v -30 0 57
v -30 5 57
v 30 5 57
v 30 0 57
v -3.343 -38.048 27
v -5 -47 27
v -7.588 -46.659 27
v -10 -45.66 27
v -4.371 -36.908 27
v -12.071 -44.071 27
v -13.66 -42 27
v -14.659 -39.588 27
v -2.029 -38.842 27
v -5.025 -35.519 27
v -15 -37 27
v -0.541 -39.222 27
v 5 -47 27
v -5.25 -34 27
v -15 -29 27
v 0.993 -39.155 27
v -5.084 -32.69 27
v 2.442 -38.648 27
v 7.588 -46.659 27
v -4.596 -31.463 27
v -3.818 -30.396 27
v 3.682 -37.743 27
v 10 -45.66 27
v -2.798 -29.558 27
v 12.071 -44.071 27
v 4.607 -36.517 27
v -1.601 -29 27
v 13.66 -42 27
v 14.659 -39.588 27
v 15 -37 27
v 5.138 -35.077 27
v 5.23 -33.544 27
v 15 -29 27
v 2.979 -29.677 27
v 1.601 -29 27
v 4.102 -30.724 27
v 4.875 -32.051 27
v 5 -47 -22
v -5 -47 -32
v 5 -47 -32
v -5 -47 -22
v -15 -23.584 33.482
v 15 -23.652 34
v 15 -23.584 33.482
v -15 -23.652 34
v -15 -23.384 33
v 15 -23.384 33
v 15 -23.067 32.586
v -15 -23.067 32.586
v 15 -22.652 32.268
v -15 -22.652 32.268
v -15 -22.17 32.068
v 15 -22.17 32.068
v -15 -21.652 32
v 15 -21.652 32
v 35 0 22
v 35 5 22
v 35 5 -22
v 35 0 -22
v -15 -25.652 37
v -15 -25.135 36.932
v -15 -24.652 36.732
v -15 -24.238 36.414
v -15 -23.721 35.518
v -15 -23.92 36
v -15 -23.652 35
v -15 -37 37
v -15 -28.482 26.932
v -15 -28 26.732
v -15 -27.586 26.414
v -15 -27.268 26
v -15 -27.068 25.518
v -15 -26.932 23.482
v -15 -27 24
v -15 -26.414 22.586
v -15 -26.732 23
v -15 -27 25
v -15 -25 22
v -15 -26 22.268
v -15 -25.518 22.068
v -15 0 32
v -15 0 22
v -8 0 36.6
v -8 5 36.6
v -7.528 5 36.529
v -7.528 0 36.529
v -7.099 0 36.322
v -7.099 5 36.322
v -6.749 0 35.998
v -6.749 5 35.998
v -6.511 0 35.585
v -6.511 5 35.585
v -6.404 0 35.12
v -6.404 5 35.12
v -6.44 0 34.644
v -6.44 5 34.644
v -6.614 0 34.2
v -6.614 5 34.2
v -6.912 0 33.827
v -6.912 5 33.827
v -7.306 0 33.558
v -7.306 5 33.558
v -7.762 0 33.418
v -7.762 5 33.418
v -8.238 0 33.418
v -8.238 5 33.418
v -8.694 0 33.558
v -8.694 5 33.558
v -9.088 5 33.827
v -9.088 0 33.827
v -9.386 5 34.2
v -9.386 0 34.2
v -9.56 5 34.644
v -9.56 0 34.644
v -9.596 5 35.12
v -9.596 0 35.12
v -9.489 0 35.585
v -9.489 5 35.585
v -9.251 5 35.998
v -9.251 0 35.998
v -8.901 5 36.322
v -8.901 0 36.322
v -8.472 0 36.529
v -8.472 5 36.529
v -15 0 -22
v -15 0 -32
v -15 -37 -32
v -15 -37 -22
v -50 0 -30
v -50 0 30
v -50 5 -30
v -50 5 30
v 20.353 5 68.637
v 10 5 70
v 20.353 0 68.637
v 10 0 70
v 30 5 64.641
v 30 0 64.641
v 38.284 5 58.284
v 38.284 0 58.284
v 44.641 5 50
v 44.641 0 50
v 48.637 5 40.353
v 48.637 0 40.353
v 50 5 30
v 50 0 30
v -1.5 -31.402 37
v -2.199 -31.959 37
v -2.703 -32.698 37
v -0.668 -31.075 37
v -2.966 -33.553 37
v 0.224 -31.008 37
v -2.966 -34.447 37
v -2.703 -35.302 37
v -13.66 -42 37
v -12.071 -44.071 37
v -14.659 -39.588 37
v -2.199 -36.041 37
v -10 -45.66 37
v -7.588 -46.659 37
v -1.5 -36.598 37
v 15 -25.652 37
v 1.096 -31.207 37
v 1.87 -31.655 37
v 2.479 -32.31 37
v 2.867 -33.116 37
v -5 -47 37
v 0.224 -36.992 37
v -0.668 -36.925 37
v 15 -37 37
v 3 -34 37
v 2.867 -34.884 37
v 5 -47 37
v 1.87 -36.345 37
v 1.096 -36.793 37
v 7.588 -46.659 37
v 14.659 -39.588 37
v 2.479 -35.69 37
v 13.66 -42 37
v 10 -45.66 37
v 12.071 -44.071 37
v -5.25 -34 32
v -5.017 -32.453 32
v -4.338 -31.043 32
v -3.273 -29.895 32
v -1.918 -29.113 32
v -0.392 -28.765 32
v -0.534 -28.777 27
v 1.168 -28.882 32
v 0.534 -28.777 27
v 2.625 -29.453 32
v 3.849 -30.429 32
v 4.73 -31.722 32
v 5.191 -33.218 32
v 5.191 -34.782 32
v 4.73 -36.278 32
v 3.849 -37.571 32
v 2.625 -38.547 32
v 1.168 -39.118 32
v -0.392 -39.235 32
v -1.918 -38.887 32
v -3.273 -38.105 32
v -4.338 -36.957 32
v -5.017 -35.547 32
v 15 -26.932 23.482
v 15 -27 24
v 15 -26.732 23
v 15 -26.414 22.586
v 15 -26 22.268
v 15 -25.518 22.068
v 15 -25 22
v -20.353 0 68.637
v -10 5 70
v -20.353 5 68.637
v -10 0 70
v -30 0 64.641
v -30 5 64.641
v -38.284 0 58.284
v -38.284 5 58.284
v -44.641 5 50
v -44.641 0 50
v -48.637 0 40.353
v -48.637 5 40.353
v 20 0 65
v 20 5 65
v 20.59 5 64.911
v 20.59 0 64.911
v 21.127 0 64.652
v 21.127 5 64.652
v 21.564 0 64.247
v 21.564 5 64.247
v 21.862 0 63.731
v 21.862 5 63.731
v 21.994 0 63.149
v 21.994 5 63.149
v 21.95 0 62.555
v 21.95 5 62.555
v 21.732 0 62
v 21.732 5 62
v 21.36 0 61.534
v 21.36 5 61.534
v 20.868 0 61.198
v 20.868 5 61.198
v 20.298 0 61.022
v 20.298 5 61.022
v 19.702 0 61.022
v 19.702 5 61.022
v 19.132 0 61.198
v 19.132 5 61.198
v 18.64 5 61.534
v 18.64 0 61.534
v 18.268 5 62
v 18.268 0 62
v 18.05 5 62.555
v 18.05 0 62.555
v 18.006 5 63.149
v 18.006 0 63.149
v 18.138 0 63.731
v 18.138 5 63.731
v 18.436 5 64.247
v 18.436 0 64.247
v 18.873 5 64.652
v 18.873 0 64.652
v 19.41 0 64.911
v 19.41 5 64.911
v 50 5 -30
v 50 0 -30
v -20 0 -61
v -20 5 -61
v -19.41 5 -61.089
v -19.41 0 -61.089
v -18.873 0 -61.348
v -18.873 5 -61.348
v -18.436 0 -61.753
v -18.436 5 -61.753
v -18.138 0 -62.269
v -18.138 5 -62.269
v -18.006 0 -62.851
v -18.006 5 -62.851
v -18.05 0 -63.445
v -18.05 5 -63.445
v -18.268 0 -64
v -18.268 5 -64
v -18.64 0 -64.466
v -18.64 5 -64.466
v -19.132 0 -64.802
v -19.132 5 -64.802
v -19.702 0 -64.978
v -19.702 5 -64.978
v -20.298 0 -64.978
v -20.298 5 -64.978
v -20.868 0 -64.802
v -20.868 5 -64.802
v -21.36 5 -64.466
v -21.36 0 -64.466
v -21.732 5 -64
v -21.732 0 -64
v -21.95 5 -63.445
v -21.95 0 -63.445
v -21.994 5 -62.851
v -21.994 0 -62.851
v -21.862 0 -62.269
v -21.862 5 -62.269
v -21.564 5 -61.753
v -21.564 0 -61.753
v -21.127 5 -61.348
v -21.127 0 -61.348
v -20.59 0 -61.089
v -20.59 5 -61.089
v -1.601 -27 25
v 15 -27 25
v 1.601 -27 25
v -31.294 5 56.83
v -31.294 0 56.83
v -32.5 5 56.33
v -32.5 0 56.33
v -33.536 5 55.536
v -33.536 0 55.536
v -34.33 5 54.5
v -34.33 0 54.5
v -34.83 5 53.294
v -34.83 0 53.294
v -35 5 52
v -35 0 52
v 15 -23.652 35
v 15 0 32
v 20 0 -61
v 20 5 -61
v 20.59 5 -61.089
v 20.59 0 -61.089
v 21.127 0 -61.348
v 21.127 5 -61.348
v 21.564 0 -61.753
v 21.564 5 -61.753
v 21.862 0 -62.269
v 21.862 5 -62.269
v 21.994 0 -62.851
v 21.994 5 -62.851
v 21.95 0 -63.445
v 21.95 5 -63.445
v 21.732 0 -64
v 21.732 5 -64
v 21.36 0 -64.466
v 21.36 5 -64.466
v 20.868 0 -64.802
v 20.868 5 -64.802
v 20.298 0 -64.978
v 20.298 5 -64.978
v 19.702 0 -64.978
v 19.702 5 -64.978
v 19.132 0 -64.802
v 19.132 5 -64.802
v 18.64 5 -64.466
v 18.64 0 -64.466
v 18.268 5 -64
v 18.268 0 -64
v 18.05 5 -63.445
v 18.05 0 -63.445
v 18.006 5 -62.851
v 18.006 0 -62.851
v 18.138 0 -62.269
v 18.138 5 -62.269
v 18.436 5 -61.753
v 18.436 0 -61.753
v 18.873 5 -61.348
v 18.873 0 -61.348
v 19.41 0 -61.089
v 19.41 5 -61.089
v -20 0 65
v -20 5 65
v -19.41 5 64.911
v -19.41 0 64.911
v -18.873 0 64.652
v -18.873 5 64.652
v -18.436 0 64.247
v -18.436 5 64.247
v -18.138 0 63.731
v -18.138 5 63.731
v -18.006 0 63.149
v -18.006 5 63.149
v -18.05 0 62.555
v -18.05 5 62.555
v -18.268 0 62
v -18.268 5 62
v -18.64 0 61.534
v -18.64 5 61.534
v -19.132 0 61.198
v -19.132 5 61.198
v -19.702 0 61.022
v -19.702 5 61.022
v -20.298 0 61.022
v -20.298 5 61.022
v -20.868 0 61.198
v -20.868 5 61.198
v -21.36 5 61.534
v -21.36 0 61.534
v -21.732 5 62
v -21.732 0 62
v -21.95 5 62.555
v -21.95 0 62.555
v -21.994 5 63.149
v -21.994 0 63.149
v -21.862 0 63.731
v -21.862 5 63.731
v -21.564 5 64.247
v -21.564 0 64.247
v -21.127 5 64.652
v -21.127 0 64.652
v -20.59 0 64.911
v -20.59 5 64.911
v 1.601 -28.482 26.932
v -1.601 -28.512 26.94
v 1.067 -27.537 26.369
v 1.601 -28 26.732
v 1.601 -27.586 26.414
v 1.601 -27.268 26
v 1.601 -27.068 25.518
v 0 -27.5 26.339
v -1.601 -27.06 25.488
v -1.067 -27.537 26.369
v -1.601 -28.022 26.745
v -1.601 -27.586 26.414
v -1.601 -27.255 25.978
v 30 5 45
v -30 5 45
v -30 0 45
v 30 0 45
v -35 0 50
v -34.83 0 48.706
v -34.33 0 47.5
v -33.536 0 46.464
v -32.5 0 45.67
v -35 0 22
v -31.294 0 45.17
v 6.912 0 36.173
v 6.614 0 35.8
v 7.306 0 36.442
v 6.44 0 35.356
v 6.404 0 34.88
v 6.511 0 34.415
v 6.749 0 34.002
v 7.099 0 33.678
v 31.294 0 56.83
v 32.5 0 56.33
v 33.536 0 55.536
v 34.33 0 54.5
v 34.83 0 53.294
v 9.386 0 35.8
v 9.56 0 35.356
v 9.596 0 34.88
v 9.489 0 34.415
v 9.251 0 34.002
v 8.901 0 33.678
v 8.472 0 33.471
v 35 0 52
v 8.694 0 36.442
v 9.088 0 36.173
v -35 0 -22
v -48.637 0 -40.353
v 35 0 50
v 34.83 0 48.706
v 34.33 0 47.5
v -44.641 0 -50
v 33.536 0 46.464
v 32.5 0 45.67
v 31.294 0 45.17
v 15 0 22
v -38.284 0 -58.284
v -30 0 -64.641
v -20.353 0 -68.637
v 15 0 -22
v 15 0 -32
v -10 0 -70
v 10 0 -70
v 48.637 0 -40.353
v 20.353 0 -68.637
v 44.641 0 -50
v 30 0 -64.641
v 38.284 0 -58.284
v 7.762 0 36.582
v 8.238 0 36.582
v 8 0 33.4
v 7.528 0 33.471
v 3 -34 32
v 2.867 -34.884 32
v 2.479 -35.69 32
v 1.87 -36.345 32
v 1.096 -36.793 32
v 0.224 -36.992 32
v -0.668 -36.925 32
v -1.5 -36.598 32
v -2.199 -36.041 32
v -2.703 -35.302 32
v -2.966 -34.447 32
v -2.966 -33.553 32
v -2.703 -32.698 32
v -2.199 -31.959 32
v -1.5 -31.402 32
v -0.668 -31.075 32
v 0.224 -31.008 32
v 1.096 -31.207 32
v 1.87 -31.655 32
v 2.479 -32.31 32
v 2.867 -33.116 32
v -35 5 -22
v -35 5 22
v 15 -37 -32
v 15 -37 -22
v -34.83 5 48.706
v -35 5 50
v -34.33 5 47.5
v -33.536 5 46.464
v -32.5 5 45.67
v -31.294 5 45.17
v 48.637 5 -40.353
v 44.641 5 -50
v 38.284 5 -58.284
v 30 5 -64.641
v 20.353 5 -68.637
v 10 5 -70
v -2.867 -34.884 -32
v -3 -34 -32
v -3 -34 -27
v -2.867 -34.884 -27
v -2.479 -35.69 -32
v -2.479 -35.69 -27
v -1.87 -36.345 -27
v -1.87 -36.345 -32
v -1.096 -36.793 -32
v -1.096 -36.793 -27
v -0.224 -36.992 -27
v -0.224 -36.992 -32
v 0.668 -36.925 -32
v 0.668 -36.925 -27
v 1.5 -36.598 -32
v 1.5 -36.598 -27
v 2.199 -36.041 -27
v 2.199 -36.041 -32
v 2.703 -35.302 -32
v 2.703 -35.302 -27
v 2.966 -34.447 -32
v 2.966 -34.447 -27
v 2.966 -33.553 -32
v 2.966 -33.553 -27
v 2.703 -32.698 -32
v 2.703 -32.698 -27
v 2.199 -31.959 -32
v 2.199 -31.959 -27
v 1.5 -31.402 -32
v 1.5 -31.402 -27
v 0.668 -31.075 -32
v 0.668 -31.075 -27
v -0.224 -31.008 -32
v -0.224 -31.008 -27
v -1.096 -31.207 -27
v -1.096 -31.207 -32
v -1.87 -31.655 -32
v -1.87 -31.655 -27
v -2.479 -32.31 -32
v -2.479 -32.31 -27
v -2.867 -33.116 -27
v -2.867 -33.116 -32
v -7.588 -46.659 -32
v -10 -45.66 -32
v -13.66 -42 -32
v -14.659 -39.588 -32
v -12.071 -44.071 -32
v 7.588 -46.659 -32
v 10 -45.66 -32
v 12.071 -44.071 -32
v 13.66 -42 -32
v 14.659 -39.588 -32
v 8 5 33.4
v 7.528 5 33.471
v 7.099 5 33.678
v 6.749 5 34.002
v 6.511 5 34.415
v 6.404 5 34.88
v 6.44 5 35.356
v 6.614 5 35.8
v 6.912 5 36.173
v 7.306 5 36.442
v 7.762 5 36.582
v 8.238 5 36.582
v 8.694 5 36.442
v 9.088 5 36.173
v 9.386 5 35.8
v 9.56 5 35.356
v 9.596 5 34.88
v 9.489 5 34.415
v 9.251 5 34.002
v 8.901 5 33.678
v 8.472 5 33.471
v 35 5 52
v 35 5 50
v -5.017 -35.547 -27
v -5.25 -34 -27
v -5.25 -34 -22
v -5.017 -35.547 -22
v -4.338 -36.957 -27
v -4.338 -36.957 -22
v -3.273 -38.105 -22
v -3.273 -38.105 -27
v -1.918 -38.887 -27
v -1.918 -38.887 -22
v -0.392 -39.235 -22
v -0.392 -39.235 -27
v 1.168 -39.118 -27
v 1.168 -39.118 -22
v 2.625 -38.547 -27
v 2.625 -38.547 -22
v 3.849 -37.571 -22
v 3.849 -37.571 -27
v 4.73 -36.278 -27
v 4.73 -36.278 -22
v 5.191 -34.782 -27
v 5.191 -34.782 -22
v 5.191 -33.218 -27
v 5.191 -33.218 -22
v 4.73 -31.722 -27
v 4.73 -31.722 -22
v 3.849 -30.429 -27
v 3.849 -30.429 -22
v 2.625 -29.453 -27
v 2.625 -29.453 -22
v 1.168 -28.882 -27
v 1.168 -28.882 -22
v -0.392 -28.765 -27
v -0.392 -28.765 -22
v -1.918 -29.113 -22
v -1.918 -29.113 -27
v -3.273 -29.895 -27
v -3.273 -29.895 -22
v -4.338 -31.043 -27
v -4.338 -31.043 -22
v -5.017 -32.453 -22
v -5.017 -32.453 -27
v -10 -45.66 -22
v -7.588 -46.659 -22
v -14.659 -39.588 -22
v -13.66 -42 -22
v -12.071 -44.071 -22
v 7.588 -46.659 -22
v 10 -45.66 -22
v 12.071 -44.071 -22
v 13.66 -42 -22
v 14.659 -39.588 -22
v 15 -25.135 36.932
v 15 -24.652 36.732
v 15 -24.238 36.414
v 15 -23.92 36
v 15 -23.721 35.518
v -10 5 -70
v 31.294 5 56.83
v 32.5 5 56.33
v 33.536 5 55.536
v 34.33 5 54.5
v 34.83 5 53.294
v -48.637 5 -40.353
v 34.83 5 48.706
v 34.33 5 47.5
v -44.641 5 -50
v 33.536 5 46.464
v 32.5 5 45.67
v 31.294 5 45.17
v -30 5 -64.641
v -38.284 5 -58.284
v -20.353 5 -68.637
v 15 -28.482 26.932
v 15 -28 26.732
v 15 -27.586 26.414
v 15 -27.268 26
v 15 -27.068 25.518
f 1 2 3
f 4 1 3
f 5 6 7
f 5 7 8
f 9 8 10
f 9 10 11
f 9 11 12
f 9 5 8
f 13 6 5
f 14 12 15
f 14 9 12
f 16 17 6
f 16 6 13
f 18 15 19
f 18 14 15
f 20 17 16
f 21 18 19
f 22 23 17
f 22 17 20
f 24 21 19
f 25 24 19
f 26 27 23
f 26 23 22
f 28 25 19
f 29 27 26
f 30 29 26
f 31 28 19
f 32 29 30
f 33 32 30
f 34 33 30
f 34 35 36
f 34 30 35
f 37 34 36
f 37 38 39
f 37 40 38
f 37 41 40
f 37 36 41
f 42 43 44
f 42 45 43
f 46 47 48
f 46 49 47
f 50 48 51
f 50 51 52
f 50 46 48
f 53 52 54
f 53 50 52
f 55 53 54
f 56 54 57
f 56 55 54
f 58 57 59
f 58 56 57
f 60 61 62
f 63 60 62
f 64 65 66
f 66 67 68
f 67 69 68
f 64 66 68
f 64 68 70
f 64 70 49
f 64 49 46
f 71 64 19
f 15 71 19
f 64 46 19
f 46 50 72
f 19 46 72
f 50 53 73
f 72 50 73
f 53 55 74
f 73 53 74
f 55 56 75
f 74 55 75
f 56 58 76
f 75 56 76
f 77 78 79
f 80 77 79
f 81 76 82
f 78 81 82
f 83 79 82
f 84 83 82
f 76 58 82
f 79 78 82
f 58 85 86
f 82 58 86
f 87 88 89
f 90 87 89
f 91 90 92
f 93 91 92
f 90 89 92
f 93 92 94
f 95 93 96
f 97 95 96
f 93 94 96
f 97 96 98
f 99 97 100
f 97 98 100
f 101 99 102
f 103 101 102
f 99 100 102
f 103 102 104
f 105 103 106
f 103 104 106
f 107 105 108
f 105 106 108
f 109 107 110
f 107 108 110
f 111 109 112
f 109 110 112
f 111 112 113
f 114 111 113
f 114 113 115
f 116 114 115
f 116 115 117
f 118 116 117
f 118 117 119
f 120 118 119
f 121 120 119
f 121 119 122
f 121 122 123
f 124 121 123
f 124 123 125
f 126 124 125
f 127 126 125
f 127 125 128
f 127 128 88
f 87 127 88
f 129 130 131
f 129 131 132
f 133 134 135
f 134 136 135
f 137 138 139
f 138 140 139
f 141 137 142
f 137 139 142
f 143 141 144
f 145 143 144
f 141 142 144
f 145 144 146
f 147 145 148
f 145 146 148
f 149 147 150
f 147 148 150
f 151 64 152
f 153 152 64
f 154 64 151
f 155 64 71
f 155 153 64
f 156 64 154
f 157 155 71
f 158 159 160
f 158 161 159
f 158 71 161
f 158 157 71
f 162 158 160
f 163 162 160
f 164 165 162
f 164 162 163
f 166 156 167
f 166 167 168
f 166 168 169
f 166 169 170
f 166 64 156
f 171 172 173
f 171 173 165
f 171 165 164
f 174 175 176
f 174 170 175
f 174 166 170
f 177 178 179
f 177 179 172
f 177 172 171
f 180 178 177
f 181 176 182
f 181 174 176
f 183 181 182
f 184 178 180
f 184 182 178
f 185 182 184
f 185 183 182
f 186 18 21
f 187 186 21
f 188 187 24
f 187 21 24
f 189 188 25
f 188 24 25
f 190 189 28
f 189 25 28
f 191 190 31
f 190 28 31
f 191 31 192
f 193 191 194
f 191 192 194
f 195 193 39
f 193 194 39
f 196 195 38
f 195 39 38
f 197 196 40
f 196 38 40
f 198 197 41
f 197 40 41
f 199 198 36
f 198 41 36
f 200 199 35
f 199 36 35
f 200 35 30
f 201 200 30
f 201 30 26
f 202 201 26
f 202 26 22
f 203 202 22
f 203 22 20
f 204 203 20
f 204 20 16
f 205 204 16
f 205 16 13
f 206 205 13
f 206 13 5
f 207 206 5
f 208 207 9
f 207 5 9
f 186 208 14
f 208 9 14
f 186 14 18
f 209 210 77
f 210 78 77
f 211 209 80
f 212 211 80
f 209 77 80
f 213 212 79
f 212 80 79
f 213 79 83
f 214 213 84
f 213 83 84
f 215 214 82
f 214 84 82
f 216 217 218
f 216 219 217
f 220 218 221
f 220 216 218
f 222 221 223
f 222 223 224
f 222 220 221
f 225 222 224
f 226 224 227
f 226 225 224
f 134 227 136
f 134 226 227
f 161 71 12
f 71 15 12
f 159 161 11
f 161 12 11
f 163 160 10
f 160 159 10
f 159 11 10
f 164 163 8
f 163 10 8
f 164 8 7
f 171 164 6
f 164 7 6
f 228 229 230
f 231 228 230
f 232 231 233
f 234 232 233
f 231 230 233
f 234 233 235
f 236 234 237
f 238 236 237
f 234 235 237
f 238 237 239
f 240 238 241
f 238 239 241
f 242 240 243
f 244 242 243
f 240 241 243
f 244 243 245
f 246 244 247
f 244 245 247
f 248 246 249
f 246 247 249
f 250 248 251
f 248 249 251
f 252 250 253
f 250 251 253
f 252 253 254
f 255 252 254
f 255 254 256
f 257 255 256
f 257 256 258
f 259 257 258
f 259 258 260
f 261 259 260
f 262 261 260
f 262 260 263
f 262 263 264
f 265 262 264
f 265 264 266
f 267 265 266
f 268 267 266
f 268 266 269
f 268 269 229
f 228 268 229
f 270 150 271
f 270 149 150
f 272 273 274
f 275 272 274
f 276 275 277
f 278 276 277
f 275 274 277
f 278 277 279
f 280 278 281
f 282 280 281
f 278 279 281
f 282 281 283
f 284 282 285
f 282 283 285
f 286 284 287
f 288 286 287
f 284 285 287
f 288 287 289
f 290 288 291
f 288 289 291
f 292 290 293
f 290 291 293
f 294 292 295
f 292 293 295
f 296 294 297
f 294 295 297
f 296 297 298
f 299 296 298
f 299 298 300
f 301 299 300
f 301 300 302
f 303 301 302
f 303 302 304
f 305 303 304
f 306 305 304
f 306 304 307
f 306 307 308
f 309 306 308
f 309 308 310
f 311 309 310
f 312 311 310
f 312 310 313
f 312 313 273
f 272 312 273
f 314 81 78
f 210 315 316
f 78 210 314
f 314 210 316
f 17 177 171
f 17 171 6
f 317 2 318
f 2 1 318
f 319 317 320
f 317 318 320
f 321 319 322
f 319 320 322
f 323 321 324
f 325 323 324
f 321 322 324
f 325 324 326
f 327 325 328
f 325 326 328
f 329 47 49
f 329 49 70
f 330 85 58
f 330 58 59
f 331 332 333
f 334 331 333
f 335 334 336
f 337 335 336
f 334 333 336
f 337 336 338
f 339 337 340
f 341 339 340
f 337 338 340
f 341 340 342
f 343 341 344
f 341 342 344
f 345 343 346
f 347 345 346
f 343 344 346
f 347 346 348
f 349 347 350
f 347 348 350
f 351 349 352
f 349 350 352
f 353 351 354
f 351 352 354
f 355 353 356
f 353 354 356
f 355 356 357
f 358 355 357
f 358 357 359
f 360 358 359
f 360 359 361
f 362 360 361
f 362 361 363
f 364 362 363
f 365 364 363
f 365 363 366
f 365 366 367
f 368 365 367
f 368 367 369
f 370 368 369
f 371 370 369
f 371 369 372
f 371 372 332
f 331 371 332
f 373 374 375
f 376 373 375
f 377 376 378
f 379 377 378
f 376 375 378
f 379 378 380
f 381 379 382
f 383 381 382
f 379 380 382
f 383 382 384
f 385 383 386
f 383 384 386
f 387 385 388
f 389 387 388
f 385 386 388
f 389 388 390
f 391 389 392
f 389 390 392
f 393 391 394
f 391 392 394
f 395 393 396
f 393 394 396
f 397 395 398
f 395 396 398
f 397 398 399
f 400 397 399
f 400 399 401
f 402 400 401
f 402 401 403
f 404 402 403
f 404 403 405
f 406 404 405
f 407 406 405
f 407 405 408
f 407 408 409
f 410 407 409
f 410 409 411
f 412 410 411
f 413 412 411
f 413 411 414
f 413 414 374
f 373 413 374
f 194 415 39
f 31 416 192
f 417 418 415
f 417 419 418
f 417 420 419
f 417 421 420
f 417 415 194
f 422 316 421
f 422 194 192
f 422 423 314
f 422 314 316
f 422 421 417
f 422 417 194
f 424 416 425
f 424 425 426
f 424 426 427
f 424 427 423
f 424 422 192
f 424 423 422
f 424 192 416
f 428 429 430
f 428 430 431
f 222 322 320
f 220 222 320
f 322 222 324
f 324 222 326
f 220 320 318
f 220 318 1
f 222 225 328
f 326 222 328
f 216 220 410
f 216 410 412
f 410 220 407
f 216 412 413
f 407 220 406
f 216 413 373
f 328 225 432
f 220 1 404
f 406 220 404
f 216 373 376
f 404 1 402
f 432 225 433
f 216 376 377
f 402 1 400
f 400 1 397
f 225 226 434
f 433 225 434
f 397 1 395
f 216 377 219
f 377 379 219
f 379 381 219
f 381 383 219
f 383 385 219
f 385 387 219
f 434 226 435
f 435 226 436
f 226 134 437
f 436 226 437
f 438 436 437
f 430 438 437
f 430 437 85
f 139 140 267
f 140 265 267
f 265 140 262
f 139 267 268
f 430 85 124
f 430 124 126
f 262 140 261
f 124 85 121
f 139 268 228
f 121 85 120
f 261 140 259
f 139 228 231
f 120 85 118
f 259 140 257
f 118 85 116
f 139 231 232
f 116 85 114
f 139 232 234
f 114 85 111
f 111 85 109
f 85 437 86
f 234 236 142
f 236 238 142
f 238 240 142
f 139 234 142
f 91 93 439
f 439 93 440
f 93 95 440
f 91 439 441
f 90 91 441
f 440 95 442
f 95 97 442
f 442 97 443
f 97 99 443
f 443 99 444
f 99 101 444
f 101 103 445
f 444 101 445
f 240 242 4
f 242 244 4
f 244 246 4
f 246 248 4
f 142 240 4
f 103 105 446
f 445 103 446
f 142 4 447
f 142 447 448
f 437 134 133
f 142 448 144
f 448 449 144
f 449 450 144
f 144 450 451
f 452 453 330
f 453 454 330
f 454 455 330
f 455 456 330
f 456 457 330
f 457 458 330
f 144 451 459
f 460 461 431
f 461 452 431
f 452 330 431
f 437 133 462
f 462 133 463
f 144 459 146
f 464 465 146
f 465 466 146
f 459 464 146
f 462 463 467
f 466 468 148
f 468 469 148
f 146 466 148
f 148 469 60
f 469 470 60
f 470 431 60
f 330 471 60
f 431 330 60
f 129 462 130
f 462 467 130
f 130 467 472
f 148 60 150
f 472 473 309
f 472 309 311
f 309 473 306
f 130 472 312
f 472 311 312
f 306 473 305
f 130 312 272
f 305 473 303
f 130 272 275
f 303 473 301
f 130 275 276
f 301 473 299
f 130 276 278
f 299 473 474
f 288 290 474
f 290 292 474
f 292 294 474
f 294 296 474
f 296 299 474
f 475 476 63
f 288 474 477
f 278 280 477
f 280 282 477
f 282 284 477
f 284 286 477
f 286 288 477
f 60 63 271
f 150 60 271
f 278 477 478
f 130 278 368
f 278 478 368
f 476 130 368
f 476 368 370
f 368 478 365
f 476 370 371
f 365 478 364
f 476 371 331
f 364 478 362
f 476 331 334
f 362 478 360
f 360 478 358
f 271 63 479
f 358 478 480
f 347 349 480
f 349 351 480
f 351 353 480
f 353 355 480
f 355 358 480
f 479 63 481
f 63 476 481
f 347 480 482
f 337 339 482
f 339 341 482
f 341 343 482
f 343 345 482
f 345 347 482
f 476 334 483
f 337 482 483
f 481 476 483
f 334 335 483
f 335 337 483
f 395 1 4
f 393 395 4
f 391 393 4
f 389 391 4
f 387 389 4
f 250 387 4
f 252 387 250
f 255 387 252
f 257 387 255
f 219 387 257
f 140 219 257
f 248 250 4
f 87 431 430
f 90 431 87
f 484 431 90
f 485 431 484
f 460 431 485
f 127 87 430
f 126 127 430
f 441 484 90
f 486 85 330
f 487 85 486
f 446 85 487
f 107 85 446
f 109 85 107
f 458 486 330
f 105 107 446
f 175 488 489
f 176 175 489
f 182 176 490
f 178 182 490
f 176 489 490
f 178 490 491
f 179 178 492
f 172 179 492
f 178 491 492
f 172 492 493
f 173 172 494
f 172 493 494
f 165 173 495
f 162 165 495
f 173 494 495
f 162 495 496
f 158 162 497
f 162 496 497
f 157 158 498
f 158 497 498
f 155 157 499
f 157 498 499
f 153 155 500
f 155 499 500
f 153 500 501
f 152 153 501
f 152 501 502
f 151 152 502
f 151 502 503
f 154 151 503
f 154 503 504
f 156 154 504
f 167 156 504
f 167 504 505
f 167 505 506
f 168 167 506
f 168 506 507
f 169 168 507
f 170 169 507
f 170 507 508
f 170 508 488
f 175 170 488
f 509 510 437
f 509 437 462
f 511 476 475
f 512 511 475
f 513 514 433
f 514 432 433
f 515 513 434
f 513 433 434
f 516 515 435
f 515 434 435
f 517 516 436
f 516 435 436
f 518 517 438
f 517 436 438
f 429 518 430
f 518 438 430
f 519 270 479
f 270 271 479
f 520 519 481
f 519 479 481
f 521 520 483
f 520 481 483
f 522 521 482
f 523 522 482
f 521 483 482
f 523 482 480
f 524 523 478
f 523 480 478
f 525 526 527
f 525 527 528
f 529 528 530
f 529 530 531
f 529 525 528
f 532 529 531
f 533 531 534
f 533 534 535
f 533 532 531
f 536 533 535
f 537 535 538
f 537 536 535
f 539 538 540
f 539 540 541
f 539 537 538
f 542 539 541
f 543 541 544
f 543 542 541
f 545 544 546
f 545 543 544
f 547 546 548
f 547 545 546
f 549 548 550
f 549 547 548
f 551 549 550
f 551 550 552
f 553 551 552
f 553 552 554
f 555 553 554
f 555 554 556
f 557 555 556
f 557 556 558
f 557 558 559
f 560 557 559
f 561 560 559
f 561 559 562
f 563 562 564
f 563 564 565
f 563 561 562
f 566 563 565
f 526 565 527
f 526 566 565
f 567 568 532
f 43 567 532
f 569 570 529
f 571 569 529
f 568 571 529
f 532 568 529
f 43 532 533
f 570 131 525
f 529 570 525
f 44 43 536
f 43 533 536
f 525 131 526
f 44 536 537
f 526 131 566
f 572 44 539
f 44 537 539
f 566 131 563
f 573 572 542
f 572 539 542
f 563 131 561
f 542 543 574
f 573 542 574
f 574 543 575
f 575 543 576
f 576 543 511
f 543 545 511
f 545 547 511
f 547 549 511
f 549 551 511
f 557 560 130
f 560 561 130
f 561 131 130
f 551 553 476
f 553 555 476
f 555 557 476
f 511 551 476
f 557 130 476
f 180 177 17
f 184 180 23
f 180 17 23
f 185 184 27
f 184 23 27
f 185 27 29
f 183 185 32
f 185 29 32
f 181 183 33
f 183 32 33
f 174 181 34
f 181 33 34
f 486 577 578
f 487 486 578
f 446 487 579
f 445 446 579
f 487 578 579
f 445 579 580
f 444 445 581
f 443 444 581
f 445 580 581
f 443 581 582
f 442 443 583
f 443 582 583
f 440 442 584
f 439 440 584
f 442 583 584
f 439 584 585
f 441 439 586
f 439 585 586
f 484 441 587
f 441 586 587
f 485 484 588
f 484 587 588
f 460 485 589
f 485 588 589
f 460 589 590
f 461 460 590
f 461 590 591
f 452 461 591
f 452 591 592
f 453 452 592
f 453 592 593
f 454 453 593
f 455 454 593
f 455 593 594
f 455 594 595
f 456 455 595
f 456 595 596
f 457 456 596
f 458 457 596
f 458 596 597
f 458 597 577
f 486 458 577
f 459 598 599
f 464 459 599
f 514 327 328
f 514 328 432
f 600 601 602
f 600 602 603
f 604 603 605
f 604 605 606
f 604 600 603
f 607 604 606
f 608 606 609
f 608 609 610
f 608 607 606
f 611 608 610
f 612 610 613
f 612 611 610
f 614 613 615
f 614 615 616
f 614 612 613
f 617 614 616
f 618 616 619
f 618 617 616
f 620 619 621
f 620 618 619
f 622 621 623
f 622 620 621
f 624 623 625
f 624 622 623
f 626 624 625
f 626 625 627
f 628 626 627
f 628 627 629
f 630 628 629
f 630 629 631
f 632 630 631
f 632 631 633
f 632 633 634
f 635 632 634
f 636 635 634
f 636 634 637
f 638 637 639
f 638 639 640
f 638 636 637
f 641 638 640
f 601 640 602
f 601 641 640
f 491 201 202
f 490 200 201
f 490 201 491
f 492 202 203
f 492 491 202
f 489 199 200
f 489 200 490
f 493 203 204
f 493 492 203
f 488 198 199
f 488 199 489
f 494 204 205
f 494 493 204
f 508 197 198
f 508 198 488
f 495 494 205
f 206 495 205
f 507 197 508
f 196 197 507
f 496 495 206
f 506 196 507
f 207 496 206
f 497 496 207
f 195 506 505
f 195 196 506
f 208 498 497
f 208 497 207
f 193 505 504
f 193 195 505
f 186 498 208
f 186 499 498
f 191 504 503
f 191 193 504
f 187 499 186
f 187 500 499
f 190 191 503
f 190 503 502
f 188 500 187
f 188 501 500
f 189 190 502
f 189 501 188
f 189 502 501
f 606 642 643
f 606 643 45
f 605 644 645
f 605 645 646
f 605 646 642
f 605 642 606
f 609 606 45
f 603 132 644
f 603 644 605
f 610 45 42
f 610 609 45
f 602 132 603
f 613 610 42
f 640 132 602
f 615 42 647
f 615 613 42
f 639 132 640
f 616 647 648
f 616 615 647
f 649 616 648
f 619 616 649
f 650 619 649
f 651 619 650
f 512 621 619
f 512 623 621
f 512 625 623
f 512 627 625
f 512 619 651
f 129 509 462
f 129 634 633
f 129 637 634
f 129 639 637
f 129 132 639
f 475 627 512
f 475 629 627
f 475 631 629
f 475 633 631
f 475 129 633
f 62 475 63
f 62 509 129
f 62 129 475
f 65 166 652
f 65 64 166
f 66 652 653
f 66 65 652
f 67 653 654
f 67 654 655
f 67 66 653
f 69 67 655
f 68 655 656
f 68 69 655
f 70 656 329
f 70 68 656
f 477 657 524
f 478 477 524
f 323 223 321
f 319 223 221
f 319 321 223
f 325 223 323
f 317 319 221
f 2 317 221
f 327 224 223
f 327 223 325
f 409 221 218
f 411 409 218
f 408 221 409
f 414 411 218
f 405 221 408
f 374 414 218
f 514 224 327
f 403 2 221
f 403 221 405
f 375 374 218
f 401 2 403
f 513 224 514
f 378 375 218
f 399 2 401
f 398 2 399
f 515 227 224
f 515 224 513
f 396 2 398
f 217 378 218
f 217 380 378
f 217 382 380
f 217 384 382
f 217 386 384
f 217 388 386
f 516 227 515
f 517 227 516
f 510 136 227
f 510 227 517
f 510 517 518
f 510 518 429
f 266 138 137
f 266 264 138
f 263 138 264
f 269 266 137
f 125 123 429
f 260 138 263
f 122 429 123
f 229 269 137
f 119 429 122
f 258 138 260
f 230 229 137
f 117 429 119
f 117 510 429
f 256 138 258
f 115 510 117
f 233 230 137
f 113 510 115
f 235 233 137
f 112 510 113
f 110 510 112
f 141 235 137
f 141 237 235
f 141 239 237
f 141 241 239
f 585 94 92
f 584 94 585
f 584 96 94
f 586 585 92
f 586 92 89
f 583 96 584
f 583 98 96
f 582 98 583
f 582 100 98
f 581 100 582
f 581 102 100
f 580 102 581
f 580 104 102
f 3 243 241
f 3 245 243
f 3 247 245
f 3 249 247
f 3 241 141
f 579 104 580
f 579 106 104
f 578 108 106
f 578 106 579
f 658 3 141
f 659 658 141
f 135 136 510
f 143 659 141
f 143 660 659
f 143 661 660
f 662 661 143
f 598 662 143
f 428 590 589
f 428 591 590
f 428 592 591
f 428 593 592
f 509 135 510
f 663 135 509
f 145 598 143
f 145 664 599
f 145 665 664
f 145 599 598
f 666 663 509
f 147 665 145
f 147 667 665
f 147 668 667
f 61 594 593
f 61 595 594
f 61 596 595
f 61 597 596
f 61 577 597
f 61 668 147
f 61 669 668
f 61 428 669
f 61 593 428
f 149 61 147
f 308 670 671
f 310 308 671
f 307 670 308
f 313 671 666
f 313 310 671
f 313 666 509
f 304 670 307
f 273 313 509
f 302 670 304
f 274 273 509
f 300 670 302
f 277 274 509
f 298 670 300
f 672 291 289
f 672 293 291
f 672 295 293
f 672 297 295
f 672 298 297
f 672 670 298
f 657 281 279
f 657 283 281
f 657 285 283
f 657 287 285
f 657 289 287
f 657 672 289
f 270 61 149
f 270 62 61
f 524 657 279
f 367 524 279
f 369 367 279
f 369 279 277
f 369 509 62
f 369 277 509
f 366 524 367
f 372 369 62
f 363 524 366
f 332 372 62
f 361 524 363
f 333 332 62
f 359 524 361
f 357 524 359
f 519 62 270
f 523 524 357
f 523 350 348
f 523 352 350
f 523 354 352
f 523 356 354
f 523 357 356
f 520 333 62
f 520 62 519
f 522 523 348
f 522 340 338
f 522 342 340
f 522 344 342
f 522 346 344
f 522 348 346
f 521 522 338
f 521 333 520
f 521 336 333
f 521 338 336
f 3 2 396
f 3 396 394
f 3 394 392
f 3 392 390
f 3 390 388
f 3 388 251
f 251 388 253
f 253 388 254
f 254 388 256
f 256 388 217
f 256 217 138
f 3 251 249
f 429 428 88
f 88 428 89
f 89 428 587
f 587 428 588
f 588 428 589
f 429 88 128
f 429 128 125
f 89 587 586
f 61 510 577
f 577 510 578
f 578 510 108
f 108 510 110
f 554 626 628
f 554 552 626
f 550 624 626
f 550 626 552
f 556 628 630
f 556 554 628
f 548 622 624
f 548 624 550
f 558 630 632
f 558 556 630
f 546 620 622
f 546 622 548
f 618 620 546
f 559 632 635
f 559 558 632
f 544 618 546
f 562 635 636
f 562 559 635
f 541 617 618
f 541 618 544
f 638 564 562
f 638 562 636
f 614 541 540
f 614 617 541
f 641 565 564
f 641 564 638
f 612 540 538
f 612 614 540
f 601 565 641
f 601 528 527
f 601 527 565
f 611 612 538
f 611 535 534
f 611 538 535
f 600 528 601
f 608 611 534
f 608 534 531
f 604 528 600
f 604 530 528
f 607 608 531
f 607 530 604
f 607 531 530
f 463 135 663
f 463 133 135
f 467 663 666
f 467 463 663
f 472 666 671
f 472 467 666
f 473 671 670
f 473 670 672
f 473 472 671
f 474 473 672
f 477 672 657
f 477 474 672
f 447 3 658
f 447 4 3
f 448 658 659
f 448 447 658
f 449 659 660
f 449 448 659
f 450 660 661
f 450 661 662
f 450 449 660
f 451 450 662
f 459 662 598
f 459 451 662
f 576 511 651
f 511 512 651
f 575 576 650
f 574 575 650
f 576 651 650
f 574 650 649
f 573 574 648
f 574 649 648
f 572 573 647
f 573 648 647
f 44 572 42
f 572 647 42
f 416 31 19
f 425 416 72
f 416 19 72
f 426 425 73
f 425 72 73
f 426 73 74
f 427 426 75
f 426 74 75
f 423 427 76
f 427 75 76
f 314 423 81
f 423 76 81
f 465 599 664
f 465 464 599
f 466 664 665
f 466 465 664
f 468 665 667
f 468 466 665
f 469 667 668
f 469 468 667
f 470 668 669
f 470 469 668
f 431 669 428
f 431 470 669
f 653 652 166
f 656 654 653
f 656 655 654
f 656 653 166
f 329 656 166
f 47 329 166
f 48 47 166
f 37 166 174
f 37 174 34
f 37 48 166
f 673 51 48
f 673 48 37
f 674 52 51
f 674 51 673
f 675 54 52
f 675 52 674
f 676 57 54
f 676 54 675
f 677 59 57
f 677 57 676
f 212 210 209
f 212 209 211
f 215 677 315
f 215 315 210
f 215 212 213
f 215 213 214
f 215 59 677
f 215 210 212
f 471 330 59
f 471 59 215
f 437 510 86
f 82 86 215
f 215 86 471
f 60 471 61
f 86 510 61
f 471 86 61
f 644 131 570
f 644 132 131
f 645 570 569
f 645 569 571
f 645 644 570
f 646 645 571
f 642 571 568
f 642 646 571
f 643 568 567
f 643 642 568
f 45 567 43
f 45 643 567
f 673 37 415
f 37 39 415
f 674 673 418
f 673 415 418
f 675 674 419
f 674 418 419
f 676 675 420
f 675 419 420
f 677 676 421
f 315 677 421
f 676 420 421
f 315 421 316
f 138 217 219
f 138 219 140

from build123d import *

# Parameters (mm, degrees)
SKETCH1_W           = 100
SKETCH1_H           = 90
BOSS_EXTRUDE1_DEPTH = 5
SKETCH2_W           = 70
SKETCH2_H           = 44
CUT_EXTRUDE1_DEPTH  = 68.453687816
SKETCH3_R           = 1.6
CUT_EXTRUDE2_DEPTH  = 68.453687816
SKETCH4_W           = 100
SKETCH4_H           = 25
BOSS_EXTRUDE2_DEPTH = 5
SKETCH6_W           = 70
SKETCH6_H           = 12
CUT_EXTRUDE4_DEPTH  = 17
SKETCH8_W           = 30
SKETCH8_H           = 10
BOSS_EXTRUDE4_DEPTH = 47
SKETCH11_R          = 5.25
CUT_EXTRUDE5_DEPTH  = 5
SKETCH12_R          = 3
CUT_EXTRUDE6_DEPTH  = 5
FILLET1_R           = 10
CUT_EXTRUDE7_START  = -5
SKETCH13_R          = 5.25
CUT_EXTRUDE7_DEPTH  = 5
CUT_EXTRUDE8_START  = -5
SKETCH14_R          = 3
CUT_EXTRUDE8_DEPTH  = 5
FILLET2_R           = 10
SKETCH15_R          = 2
CUT_EXTRUDE9_DEPTH  = 101.518654985
FILLET3_R           = 40
FILLET4_R           = 40
FILLET5_R           = 5
BOSS_EXTRUDE5_DEPTH = 30
SKETCH17_R          = 5.25
CUT_EXTRUDE10_DEPTH = 10
SKETCH18_R          = 3
CUT_EXTRUDE12_DEPTH = 21
CUT_EXTRUDE13_DEPTH = 21
SKETCH20_W          = 5
SKETCH20_H          = 20
CUT_EXTRUDE14_DEPTH = 107.46126056
FILLET6_R           = 2
FILLET7_R           = 2


with BuildPart() as part:
    # Sketch1 → Boss-Extrude1 (new body)
    with BuildSketch(Plane(origin=(0, 0, 0), x_dir=(1, 0, 0), z_dir=(0, 1, 0))):
        Rectangle(SKETCH1_W, SKETCH1_H)
    extrude(amount=BOSS_EXTRUDE1_DEPTH)

    # Sketch2 → Cut-Extrude1 (cut, through all)
    with BuildSketch(Plane(origin=(0, 5, 0), x_dir=(1, 0, 0), z_dir=(0, 1, 0))):
        Rectangle(SKETCH2_W, SKETCH2_H)
    extrude(amount=-CUT_EXTRUDE1_DEPTH, mode=Mode.SUBTRACT)

    # Sketch3 → Cut-Extrude2 (cut, through all)
    with BuildSketch(Plane(origin=(0, 5, 0), x_dir=(1, 0, 0), z_dir=(0, 1, 0))):
        with Locations(Location((-8, -35, 0), (0, 0, 270))):
            Circle(SKETCH3_R)
        with Locations(Location((8, -35, 0), (0, 0, 90))):
            Circle(SKETCH3_R)
    extrude(amount=-CUT_EXTRUDE2_DEPTH, mode=Mode.SUBTRACT)

    # Sketch4 → Boss-Extrude2 (add)
    with BuildSketch(Plane(origin=(0, 5, 0), x_dir=(1, 0, 0), z_dir=(0, 1, 0))):
        with Locations((0, -57.5)):
            Rectangle(SKETCH4_W, SKETCH4_H)
        with Locations((0, 57.5)):
            Rectangle(SKETCH4_W, SKETCH4_H)
    extrude(amount=-BOSS_EXTRUDE2_DEPTH)

    # Sketch6 → Cut-Extrude4 (cut)
    with BuildSketch(Plane(origin=(0, 5, 0), x_dir=(1, 0, 0), z_dir=(0, 1, 0))):
        with Locations((0, -51)):
            Rectangle(SKETCH6_W, SKETCH6_H)
    extrude(amount=-CUT_EXTRUDE4_DEPTH, mode=Mode.SUBTRACT)

    # Sketch8 → Boss-Extrude4 (add)
    with BuildSketch(Plane.XZ):
        with Locations((0, 27)):
            Rectangle(SKETCH8_W, SKETCH8_H)
        with Locations((0, -27)):
            Rectangle(SKETCH8_W, SKETCH8_H)
    extrude(amount=BOSS_EXTRUDE4_DEPTH)

    # Sketch11 → Cut-Extrude5 (cut)
    with BuildSketch(Plane(origin=(0, 0, 22), x_dir=(-1, 0, 0), z_dir=(0, 0, -1))):
        with Locations((0, -34)):
            Circle(SKETCH11_R)
    extrude(amount=-CUT_EXTRUDE5_DEPTH, mode=Mode.SUBTRACT)

    # Sketch12 → Cut-Extrude6 (cut)
    with BuildSketch(Plane(origin=(0, 0, 27), x_dir=(-1, 0, 0), z_dir=(0, 0, -1))):
        with Locations((0, -34)):
            Circle(SKETCH12_R)
    extrude(amount=-CUT_EXTRUDE6_DEPTH, mode=Mode.SUBTRACT)

    # Fillet1
    fillet1_edges = [part.edges().sort_by_distance(p)[0] for p in [
        (-15, -47, 27),
        (15, -47, 27),
    ]]
    fillet(fillet1_edges, radius=FILLET1_R)

    # Sketch13 → Cut-Extrude7 (cut)
    with BuildSketch(Plane.XY.offset(-22).offset(CUT_EXTRUDE7_START)):
        with Locations(Location((0, -34, 0), (0, 0, 180))):
            Circle(SKETCH13_R)
    extrude(amount=CUT_EXTRUDE7_DEPTH, mode=Mode.SUBTRACT)

    # Sketch14 → Cut-Extrude8 (cut)
    with BuildSketch(Plane.XY.offset(-27).offset(CUT_EXTRUDE8_START)):
        with Locations(Location((0, -34, 0), (0, 0, 180))):
            Circle(SKETCH14_R)
    extrude(amount=CUT_EXTRUDE8_DEPTH, mode=Mode.SUBTRACT)

    # Fillet2
    fillet2_edges = [part.edges().sort_by_distance(p)[0] for p in [
        (15, -47, -27),
        (-15, -47, -27),
    ]]
    fillet(fillet2_edges, radius=FILLET2_R)

    # Sketch15 → Cut-Extrude9 (cut, through all)
    with BuildSketch(Plane(origin=(0, 5, 0), x_dir=(1, 0, 0), z_dir=(0, 1, 0))):
        with Locations(Location((-20, -63, 0), (0, 0, 270))):
            Circle(SKETCH15_R)
        with Locations(Location((-20, 63, 0), (0, 0, 270))):
            Circle(SKETCH15_R)
        with Locations(Location((20, -63, 0), (0, 0, 270))):
            Circle(SKETCH15_R)
        with Locations(Location((20, 63, 0), (0, 0, 270))):
            Circle(SKETCH15_R)
    extrude(amount=-CUT_EXTRUDE9_DEPTH, mode=Mode.SUBTRACT)

    # Fillet3
    fillet3_edges = [part.edges().sort_by_distance(p)[0] for p in [
        (-50, 2.5, 70),
        (50, 2.5, 70),
    ]]
    fillet(fillet3_edges, radius=FILLET3_R)

    # Fillet4
    fillet4_edges = [part.edges().sort_by_distance(p)[0] for p in [
        (-50, 2.5, -70),
        (50, 2.5, -70),
    ]]
    fillet(fillet4_edges, radius=FILLET4_R)

    # Fillet5
    fillet5_edges = [part.edges().sort_by_distance(p)[0] for p in [
        (-35, 2.5, 57),
        (-35, 2.5, 45),
        (35, 2.5, 45),
        (35, 2.5, 57),
    ]]
    fillet(fillet5_edges, radius=FILLET5_R)

    # Sketch16 → Boss-Extrude5 (add)
    with BuildSketch(Plane(origin=(15, 0, 0), x_dir=(0, 0, -1), z_dir=(1, 0, 0))):
        Polygon((-32, -23.652392467), (-37, -23.652392467), (-37, -47), (-27, -47), (-27, -23.652392467), align=None)
    extrude(amount=-BOSS_EXTRUDE5_DEPTH)

    # Sketch17 → Cut-Extrude10 (cut)
    with BuildSketch(Plane(origin=(0, 0, 22), x_dir=(-1, 0, 0), z_dir=(0, 0, -1))):
        with Locations((0, -34)):
            Circle(SKETCH17_R)
    extrude(amount=-CUT_EXTRUDE10_DEPTH, mode=Mode.SUBTRACT)

    # Sketch18 → Cut-Extrude12 (cut)
    with BuildSketch(Plane(origin=(0, 0, 22), x_dir=(-1, 0, 0), z_dir=(0, 0, -1))):
        with Locations(Location((0, -34, 0), (0, 0, 180))):
            Circle(SKETCH18_R)
    extrude(amount=-CUT_EXTRUDE12_DEPTH, mode=Mode.SUBTRACT)

    # Sketch19 → Cut-Extrude13 (cut)
    with BuildSketch(Plane(origin=(0, 0, 22), x_dir=(-1, 0, 0), z_dir=(0, 0, -1))):
        with BuildLine():
            Line((-15, -37), (-15, -47))
            Line((-15, -47), (-5, -47))
            ThreePointArc((-5, -47), (-12.071067812, -44.071067812), (-15, -37))
        make_face()
        with BuildLine():
            Line((5, -47), (15, -47))
            Line((15, -47), (15, -37))
            ThreePointArc((15, -37), (12.071067812, -44.071067812), (5, -47))
        make_face()
    extrude(amount=-CUT_EXTRUDE13_DEPTH, mode=Mode.SUBTRACT)

    # Sketch20 → Cut-Extrude14 (cut, through all)
    with BuildSketch(Plane(origin=(15, 0, 0), x_dir=(0, 0, -1), z_dir=(1, 0, 0))):
        with Locations((-24.5, -37)):
            Rectangle(SKETCH20_W, SKETCH20_H)
    extrude(amount=-CUT_EXTRUDE14_DEPTH, mode=Mode.SUBTRACT)

    # Fillet6
    fillet6_edges = [part.edges().sort_by_distance(p)[0] for p in [
        (0, -23.652392467, 32),
        (0, -23.652392467, 37),
    ]]
    fillet(fillet6_edges, radius=FILLET6_R)

    # Fillet7
    fillet7_edges = [part.edges().sort_by_distance(p)[0] for p in [
        (0, -27, 27),
        (0, -27, 22),
    ]]
    fillet(fillet7_edges, radius=FILLET7_R)


solid = part.part
